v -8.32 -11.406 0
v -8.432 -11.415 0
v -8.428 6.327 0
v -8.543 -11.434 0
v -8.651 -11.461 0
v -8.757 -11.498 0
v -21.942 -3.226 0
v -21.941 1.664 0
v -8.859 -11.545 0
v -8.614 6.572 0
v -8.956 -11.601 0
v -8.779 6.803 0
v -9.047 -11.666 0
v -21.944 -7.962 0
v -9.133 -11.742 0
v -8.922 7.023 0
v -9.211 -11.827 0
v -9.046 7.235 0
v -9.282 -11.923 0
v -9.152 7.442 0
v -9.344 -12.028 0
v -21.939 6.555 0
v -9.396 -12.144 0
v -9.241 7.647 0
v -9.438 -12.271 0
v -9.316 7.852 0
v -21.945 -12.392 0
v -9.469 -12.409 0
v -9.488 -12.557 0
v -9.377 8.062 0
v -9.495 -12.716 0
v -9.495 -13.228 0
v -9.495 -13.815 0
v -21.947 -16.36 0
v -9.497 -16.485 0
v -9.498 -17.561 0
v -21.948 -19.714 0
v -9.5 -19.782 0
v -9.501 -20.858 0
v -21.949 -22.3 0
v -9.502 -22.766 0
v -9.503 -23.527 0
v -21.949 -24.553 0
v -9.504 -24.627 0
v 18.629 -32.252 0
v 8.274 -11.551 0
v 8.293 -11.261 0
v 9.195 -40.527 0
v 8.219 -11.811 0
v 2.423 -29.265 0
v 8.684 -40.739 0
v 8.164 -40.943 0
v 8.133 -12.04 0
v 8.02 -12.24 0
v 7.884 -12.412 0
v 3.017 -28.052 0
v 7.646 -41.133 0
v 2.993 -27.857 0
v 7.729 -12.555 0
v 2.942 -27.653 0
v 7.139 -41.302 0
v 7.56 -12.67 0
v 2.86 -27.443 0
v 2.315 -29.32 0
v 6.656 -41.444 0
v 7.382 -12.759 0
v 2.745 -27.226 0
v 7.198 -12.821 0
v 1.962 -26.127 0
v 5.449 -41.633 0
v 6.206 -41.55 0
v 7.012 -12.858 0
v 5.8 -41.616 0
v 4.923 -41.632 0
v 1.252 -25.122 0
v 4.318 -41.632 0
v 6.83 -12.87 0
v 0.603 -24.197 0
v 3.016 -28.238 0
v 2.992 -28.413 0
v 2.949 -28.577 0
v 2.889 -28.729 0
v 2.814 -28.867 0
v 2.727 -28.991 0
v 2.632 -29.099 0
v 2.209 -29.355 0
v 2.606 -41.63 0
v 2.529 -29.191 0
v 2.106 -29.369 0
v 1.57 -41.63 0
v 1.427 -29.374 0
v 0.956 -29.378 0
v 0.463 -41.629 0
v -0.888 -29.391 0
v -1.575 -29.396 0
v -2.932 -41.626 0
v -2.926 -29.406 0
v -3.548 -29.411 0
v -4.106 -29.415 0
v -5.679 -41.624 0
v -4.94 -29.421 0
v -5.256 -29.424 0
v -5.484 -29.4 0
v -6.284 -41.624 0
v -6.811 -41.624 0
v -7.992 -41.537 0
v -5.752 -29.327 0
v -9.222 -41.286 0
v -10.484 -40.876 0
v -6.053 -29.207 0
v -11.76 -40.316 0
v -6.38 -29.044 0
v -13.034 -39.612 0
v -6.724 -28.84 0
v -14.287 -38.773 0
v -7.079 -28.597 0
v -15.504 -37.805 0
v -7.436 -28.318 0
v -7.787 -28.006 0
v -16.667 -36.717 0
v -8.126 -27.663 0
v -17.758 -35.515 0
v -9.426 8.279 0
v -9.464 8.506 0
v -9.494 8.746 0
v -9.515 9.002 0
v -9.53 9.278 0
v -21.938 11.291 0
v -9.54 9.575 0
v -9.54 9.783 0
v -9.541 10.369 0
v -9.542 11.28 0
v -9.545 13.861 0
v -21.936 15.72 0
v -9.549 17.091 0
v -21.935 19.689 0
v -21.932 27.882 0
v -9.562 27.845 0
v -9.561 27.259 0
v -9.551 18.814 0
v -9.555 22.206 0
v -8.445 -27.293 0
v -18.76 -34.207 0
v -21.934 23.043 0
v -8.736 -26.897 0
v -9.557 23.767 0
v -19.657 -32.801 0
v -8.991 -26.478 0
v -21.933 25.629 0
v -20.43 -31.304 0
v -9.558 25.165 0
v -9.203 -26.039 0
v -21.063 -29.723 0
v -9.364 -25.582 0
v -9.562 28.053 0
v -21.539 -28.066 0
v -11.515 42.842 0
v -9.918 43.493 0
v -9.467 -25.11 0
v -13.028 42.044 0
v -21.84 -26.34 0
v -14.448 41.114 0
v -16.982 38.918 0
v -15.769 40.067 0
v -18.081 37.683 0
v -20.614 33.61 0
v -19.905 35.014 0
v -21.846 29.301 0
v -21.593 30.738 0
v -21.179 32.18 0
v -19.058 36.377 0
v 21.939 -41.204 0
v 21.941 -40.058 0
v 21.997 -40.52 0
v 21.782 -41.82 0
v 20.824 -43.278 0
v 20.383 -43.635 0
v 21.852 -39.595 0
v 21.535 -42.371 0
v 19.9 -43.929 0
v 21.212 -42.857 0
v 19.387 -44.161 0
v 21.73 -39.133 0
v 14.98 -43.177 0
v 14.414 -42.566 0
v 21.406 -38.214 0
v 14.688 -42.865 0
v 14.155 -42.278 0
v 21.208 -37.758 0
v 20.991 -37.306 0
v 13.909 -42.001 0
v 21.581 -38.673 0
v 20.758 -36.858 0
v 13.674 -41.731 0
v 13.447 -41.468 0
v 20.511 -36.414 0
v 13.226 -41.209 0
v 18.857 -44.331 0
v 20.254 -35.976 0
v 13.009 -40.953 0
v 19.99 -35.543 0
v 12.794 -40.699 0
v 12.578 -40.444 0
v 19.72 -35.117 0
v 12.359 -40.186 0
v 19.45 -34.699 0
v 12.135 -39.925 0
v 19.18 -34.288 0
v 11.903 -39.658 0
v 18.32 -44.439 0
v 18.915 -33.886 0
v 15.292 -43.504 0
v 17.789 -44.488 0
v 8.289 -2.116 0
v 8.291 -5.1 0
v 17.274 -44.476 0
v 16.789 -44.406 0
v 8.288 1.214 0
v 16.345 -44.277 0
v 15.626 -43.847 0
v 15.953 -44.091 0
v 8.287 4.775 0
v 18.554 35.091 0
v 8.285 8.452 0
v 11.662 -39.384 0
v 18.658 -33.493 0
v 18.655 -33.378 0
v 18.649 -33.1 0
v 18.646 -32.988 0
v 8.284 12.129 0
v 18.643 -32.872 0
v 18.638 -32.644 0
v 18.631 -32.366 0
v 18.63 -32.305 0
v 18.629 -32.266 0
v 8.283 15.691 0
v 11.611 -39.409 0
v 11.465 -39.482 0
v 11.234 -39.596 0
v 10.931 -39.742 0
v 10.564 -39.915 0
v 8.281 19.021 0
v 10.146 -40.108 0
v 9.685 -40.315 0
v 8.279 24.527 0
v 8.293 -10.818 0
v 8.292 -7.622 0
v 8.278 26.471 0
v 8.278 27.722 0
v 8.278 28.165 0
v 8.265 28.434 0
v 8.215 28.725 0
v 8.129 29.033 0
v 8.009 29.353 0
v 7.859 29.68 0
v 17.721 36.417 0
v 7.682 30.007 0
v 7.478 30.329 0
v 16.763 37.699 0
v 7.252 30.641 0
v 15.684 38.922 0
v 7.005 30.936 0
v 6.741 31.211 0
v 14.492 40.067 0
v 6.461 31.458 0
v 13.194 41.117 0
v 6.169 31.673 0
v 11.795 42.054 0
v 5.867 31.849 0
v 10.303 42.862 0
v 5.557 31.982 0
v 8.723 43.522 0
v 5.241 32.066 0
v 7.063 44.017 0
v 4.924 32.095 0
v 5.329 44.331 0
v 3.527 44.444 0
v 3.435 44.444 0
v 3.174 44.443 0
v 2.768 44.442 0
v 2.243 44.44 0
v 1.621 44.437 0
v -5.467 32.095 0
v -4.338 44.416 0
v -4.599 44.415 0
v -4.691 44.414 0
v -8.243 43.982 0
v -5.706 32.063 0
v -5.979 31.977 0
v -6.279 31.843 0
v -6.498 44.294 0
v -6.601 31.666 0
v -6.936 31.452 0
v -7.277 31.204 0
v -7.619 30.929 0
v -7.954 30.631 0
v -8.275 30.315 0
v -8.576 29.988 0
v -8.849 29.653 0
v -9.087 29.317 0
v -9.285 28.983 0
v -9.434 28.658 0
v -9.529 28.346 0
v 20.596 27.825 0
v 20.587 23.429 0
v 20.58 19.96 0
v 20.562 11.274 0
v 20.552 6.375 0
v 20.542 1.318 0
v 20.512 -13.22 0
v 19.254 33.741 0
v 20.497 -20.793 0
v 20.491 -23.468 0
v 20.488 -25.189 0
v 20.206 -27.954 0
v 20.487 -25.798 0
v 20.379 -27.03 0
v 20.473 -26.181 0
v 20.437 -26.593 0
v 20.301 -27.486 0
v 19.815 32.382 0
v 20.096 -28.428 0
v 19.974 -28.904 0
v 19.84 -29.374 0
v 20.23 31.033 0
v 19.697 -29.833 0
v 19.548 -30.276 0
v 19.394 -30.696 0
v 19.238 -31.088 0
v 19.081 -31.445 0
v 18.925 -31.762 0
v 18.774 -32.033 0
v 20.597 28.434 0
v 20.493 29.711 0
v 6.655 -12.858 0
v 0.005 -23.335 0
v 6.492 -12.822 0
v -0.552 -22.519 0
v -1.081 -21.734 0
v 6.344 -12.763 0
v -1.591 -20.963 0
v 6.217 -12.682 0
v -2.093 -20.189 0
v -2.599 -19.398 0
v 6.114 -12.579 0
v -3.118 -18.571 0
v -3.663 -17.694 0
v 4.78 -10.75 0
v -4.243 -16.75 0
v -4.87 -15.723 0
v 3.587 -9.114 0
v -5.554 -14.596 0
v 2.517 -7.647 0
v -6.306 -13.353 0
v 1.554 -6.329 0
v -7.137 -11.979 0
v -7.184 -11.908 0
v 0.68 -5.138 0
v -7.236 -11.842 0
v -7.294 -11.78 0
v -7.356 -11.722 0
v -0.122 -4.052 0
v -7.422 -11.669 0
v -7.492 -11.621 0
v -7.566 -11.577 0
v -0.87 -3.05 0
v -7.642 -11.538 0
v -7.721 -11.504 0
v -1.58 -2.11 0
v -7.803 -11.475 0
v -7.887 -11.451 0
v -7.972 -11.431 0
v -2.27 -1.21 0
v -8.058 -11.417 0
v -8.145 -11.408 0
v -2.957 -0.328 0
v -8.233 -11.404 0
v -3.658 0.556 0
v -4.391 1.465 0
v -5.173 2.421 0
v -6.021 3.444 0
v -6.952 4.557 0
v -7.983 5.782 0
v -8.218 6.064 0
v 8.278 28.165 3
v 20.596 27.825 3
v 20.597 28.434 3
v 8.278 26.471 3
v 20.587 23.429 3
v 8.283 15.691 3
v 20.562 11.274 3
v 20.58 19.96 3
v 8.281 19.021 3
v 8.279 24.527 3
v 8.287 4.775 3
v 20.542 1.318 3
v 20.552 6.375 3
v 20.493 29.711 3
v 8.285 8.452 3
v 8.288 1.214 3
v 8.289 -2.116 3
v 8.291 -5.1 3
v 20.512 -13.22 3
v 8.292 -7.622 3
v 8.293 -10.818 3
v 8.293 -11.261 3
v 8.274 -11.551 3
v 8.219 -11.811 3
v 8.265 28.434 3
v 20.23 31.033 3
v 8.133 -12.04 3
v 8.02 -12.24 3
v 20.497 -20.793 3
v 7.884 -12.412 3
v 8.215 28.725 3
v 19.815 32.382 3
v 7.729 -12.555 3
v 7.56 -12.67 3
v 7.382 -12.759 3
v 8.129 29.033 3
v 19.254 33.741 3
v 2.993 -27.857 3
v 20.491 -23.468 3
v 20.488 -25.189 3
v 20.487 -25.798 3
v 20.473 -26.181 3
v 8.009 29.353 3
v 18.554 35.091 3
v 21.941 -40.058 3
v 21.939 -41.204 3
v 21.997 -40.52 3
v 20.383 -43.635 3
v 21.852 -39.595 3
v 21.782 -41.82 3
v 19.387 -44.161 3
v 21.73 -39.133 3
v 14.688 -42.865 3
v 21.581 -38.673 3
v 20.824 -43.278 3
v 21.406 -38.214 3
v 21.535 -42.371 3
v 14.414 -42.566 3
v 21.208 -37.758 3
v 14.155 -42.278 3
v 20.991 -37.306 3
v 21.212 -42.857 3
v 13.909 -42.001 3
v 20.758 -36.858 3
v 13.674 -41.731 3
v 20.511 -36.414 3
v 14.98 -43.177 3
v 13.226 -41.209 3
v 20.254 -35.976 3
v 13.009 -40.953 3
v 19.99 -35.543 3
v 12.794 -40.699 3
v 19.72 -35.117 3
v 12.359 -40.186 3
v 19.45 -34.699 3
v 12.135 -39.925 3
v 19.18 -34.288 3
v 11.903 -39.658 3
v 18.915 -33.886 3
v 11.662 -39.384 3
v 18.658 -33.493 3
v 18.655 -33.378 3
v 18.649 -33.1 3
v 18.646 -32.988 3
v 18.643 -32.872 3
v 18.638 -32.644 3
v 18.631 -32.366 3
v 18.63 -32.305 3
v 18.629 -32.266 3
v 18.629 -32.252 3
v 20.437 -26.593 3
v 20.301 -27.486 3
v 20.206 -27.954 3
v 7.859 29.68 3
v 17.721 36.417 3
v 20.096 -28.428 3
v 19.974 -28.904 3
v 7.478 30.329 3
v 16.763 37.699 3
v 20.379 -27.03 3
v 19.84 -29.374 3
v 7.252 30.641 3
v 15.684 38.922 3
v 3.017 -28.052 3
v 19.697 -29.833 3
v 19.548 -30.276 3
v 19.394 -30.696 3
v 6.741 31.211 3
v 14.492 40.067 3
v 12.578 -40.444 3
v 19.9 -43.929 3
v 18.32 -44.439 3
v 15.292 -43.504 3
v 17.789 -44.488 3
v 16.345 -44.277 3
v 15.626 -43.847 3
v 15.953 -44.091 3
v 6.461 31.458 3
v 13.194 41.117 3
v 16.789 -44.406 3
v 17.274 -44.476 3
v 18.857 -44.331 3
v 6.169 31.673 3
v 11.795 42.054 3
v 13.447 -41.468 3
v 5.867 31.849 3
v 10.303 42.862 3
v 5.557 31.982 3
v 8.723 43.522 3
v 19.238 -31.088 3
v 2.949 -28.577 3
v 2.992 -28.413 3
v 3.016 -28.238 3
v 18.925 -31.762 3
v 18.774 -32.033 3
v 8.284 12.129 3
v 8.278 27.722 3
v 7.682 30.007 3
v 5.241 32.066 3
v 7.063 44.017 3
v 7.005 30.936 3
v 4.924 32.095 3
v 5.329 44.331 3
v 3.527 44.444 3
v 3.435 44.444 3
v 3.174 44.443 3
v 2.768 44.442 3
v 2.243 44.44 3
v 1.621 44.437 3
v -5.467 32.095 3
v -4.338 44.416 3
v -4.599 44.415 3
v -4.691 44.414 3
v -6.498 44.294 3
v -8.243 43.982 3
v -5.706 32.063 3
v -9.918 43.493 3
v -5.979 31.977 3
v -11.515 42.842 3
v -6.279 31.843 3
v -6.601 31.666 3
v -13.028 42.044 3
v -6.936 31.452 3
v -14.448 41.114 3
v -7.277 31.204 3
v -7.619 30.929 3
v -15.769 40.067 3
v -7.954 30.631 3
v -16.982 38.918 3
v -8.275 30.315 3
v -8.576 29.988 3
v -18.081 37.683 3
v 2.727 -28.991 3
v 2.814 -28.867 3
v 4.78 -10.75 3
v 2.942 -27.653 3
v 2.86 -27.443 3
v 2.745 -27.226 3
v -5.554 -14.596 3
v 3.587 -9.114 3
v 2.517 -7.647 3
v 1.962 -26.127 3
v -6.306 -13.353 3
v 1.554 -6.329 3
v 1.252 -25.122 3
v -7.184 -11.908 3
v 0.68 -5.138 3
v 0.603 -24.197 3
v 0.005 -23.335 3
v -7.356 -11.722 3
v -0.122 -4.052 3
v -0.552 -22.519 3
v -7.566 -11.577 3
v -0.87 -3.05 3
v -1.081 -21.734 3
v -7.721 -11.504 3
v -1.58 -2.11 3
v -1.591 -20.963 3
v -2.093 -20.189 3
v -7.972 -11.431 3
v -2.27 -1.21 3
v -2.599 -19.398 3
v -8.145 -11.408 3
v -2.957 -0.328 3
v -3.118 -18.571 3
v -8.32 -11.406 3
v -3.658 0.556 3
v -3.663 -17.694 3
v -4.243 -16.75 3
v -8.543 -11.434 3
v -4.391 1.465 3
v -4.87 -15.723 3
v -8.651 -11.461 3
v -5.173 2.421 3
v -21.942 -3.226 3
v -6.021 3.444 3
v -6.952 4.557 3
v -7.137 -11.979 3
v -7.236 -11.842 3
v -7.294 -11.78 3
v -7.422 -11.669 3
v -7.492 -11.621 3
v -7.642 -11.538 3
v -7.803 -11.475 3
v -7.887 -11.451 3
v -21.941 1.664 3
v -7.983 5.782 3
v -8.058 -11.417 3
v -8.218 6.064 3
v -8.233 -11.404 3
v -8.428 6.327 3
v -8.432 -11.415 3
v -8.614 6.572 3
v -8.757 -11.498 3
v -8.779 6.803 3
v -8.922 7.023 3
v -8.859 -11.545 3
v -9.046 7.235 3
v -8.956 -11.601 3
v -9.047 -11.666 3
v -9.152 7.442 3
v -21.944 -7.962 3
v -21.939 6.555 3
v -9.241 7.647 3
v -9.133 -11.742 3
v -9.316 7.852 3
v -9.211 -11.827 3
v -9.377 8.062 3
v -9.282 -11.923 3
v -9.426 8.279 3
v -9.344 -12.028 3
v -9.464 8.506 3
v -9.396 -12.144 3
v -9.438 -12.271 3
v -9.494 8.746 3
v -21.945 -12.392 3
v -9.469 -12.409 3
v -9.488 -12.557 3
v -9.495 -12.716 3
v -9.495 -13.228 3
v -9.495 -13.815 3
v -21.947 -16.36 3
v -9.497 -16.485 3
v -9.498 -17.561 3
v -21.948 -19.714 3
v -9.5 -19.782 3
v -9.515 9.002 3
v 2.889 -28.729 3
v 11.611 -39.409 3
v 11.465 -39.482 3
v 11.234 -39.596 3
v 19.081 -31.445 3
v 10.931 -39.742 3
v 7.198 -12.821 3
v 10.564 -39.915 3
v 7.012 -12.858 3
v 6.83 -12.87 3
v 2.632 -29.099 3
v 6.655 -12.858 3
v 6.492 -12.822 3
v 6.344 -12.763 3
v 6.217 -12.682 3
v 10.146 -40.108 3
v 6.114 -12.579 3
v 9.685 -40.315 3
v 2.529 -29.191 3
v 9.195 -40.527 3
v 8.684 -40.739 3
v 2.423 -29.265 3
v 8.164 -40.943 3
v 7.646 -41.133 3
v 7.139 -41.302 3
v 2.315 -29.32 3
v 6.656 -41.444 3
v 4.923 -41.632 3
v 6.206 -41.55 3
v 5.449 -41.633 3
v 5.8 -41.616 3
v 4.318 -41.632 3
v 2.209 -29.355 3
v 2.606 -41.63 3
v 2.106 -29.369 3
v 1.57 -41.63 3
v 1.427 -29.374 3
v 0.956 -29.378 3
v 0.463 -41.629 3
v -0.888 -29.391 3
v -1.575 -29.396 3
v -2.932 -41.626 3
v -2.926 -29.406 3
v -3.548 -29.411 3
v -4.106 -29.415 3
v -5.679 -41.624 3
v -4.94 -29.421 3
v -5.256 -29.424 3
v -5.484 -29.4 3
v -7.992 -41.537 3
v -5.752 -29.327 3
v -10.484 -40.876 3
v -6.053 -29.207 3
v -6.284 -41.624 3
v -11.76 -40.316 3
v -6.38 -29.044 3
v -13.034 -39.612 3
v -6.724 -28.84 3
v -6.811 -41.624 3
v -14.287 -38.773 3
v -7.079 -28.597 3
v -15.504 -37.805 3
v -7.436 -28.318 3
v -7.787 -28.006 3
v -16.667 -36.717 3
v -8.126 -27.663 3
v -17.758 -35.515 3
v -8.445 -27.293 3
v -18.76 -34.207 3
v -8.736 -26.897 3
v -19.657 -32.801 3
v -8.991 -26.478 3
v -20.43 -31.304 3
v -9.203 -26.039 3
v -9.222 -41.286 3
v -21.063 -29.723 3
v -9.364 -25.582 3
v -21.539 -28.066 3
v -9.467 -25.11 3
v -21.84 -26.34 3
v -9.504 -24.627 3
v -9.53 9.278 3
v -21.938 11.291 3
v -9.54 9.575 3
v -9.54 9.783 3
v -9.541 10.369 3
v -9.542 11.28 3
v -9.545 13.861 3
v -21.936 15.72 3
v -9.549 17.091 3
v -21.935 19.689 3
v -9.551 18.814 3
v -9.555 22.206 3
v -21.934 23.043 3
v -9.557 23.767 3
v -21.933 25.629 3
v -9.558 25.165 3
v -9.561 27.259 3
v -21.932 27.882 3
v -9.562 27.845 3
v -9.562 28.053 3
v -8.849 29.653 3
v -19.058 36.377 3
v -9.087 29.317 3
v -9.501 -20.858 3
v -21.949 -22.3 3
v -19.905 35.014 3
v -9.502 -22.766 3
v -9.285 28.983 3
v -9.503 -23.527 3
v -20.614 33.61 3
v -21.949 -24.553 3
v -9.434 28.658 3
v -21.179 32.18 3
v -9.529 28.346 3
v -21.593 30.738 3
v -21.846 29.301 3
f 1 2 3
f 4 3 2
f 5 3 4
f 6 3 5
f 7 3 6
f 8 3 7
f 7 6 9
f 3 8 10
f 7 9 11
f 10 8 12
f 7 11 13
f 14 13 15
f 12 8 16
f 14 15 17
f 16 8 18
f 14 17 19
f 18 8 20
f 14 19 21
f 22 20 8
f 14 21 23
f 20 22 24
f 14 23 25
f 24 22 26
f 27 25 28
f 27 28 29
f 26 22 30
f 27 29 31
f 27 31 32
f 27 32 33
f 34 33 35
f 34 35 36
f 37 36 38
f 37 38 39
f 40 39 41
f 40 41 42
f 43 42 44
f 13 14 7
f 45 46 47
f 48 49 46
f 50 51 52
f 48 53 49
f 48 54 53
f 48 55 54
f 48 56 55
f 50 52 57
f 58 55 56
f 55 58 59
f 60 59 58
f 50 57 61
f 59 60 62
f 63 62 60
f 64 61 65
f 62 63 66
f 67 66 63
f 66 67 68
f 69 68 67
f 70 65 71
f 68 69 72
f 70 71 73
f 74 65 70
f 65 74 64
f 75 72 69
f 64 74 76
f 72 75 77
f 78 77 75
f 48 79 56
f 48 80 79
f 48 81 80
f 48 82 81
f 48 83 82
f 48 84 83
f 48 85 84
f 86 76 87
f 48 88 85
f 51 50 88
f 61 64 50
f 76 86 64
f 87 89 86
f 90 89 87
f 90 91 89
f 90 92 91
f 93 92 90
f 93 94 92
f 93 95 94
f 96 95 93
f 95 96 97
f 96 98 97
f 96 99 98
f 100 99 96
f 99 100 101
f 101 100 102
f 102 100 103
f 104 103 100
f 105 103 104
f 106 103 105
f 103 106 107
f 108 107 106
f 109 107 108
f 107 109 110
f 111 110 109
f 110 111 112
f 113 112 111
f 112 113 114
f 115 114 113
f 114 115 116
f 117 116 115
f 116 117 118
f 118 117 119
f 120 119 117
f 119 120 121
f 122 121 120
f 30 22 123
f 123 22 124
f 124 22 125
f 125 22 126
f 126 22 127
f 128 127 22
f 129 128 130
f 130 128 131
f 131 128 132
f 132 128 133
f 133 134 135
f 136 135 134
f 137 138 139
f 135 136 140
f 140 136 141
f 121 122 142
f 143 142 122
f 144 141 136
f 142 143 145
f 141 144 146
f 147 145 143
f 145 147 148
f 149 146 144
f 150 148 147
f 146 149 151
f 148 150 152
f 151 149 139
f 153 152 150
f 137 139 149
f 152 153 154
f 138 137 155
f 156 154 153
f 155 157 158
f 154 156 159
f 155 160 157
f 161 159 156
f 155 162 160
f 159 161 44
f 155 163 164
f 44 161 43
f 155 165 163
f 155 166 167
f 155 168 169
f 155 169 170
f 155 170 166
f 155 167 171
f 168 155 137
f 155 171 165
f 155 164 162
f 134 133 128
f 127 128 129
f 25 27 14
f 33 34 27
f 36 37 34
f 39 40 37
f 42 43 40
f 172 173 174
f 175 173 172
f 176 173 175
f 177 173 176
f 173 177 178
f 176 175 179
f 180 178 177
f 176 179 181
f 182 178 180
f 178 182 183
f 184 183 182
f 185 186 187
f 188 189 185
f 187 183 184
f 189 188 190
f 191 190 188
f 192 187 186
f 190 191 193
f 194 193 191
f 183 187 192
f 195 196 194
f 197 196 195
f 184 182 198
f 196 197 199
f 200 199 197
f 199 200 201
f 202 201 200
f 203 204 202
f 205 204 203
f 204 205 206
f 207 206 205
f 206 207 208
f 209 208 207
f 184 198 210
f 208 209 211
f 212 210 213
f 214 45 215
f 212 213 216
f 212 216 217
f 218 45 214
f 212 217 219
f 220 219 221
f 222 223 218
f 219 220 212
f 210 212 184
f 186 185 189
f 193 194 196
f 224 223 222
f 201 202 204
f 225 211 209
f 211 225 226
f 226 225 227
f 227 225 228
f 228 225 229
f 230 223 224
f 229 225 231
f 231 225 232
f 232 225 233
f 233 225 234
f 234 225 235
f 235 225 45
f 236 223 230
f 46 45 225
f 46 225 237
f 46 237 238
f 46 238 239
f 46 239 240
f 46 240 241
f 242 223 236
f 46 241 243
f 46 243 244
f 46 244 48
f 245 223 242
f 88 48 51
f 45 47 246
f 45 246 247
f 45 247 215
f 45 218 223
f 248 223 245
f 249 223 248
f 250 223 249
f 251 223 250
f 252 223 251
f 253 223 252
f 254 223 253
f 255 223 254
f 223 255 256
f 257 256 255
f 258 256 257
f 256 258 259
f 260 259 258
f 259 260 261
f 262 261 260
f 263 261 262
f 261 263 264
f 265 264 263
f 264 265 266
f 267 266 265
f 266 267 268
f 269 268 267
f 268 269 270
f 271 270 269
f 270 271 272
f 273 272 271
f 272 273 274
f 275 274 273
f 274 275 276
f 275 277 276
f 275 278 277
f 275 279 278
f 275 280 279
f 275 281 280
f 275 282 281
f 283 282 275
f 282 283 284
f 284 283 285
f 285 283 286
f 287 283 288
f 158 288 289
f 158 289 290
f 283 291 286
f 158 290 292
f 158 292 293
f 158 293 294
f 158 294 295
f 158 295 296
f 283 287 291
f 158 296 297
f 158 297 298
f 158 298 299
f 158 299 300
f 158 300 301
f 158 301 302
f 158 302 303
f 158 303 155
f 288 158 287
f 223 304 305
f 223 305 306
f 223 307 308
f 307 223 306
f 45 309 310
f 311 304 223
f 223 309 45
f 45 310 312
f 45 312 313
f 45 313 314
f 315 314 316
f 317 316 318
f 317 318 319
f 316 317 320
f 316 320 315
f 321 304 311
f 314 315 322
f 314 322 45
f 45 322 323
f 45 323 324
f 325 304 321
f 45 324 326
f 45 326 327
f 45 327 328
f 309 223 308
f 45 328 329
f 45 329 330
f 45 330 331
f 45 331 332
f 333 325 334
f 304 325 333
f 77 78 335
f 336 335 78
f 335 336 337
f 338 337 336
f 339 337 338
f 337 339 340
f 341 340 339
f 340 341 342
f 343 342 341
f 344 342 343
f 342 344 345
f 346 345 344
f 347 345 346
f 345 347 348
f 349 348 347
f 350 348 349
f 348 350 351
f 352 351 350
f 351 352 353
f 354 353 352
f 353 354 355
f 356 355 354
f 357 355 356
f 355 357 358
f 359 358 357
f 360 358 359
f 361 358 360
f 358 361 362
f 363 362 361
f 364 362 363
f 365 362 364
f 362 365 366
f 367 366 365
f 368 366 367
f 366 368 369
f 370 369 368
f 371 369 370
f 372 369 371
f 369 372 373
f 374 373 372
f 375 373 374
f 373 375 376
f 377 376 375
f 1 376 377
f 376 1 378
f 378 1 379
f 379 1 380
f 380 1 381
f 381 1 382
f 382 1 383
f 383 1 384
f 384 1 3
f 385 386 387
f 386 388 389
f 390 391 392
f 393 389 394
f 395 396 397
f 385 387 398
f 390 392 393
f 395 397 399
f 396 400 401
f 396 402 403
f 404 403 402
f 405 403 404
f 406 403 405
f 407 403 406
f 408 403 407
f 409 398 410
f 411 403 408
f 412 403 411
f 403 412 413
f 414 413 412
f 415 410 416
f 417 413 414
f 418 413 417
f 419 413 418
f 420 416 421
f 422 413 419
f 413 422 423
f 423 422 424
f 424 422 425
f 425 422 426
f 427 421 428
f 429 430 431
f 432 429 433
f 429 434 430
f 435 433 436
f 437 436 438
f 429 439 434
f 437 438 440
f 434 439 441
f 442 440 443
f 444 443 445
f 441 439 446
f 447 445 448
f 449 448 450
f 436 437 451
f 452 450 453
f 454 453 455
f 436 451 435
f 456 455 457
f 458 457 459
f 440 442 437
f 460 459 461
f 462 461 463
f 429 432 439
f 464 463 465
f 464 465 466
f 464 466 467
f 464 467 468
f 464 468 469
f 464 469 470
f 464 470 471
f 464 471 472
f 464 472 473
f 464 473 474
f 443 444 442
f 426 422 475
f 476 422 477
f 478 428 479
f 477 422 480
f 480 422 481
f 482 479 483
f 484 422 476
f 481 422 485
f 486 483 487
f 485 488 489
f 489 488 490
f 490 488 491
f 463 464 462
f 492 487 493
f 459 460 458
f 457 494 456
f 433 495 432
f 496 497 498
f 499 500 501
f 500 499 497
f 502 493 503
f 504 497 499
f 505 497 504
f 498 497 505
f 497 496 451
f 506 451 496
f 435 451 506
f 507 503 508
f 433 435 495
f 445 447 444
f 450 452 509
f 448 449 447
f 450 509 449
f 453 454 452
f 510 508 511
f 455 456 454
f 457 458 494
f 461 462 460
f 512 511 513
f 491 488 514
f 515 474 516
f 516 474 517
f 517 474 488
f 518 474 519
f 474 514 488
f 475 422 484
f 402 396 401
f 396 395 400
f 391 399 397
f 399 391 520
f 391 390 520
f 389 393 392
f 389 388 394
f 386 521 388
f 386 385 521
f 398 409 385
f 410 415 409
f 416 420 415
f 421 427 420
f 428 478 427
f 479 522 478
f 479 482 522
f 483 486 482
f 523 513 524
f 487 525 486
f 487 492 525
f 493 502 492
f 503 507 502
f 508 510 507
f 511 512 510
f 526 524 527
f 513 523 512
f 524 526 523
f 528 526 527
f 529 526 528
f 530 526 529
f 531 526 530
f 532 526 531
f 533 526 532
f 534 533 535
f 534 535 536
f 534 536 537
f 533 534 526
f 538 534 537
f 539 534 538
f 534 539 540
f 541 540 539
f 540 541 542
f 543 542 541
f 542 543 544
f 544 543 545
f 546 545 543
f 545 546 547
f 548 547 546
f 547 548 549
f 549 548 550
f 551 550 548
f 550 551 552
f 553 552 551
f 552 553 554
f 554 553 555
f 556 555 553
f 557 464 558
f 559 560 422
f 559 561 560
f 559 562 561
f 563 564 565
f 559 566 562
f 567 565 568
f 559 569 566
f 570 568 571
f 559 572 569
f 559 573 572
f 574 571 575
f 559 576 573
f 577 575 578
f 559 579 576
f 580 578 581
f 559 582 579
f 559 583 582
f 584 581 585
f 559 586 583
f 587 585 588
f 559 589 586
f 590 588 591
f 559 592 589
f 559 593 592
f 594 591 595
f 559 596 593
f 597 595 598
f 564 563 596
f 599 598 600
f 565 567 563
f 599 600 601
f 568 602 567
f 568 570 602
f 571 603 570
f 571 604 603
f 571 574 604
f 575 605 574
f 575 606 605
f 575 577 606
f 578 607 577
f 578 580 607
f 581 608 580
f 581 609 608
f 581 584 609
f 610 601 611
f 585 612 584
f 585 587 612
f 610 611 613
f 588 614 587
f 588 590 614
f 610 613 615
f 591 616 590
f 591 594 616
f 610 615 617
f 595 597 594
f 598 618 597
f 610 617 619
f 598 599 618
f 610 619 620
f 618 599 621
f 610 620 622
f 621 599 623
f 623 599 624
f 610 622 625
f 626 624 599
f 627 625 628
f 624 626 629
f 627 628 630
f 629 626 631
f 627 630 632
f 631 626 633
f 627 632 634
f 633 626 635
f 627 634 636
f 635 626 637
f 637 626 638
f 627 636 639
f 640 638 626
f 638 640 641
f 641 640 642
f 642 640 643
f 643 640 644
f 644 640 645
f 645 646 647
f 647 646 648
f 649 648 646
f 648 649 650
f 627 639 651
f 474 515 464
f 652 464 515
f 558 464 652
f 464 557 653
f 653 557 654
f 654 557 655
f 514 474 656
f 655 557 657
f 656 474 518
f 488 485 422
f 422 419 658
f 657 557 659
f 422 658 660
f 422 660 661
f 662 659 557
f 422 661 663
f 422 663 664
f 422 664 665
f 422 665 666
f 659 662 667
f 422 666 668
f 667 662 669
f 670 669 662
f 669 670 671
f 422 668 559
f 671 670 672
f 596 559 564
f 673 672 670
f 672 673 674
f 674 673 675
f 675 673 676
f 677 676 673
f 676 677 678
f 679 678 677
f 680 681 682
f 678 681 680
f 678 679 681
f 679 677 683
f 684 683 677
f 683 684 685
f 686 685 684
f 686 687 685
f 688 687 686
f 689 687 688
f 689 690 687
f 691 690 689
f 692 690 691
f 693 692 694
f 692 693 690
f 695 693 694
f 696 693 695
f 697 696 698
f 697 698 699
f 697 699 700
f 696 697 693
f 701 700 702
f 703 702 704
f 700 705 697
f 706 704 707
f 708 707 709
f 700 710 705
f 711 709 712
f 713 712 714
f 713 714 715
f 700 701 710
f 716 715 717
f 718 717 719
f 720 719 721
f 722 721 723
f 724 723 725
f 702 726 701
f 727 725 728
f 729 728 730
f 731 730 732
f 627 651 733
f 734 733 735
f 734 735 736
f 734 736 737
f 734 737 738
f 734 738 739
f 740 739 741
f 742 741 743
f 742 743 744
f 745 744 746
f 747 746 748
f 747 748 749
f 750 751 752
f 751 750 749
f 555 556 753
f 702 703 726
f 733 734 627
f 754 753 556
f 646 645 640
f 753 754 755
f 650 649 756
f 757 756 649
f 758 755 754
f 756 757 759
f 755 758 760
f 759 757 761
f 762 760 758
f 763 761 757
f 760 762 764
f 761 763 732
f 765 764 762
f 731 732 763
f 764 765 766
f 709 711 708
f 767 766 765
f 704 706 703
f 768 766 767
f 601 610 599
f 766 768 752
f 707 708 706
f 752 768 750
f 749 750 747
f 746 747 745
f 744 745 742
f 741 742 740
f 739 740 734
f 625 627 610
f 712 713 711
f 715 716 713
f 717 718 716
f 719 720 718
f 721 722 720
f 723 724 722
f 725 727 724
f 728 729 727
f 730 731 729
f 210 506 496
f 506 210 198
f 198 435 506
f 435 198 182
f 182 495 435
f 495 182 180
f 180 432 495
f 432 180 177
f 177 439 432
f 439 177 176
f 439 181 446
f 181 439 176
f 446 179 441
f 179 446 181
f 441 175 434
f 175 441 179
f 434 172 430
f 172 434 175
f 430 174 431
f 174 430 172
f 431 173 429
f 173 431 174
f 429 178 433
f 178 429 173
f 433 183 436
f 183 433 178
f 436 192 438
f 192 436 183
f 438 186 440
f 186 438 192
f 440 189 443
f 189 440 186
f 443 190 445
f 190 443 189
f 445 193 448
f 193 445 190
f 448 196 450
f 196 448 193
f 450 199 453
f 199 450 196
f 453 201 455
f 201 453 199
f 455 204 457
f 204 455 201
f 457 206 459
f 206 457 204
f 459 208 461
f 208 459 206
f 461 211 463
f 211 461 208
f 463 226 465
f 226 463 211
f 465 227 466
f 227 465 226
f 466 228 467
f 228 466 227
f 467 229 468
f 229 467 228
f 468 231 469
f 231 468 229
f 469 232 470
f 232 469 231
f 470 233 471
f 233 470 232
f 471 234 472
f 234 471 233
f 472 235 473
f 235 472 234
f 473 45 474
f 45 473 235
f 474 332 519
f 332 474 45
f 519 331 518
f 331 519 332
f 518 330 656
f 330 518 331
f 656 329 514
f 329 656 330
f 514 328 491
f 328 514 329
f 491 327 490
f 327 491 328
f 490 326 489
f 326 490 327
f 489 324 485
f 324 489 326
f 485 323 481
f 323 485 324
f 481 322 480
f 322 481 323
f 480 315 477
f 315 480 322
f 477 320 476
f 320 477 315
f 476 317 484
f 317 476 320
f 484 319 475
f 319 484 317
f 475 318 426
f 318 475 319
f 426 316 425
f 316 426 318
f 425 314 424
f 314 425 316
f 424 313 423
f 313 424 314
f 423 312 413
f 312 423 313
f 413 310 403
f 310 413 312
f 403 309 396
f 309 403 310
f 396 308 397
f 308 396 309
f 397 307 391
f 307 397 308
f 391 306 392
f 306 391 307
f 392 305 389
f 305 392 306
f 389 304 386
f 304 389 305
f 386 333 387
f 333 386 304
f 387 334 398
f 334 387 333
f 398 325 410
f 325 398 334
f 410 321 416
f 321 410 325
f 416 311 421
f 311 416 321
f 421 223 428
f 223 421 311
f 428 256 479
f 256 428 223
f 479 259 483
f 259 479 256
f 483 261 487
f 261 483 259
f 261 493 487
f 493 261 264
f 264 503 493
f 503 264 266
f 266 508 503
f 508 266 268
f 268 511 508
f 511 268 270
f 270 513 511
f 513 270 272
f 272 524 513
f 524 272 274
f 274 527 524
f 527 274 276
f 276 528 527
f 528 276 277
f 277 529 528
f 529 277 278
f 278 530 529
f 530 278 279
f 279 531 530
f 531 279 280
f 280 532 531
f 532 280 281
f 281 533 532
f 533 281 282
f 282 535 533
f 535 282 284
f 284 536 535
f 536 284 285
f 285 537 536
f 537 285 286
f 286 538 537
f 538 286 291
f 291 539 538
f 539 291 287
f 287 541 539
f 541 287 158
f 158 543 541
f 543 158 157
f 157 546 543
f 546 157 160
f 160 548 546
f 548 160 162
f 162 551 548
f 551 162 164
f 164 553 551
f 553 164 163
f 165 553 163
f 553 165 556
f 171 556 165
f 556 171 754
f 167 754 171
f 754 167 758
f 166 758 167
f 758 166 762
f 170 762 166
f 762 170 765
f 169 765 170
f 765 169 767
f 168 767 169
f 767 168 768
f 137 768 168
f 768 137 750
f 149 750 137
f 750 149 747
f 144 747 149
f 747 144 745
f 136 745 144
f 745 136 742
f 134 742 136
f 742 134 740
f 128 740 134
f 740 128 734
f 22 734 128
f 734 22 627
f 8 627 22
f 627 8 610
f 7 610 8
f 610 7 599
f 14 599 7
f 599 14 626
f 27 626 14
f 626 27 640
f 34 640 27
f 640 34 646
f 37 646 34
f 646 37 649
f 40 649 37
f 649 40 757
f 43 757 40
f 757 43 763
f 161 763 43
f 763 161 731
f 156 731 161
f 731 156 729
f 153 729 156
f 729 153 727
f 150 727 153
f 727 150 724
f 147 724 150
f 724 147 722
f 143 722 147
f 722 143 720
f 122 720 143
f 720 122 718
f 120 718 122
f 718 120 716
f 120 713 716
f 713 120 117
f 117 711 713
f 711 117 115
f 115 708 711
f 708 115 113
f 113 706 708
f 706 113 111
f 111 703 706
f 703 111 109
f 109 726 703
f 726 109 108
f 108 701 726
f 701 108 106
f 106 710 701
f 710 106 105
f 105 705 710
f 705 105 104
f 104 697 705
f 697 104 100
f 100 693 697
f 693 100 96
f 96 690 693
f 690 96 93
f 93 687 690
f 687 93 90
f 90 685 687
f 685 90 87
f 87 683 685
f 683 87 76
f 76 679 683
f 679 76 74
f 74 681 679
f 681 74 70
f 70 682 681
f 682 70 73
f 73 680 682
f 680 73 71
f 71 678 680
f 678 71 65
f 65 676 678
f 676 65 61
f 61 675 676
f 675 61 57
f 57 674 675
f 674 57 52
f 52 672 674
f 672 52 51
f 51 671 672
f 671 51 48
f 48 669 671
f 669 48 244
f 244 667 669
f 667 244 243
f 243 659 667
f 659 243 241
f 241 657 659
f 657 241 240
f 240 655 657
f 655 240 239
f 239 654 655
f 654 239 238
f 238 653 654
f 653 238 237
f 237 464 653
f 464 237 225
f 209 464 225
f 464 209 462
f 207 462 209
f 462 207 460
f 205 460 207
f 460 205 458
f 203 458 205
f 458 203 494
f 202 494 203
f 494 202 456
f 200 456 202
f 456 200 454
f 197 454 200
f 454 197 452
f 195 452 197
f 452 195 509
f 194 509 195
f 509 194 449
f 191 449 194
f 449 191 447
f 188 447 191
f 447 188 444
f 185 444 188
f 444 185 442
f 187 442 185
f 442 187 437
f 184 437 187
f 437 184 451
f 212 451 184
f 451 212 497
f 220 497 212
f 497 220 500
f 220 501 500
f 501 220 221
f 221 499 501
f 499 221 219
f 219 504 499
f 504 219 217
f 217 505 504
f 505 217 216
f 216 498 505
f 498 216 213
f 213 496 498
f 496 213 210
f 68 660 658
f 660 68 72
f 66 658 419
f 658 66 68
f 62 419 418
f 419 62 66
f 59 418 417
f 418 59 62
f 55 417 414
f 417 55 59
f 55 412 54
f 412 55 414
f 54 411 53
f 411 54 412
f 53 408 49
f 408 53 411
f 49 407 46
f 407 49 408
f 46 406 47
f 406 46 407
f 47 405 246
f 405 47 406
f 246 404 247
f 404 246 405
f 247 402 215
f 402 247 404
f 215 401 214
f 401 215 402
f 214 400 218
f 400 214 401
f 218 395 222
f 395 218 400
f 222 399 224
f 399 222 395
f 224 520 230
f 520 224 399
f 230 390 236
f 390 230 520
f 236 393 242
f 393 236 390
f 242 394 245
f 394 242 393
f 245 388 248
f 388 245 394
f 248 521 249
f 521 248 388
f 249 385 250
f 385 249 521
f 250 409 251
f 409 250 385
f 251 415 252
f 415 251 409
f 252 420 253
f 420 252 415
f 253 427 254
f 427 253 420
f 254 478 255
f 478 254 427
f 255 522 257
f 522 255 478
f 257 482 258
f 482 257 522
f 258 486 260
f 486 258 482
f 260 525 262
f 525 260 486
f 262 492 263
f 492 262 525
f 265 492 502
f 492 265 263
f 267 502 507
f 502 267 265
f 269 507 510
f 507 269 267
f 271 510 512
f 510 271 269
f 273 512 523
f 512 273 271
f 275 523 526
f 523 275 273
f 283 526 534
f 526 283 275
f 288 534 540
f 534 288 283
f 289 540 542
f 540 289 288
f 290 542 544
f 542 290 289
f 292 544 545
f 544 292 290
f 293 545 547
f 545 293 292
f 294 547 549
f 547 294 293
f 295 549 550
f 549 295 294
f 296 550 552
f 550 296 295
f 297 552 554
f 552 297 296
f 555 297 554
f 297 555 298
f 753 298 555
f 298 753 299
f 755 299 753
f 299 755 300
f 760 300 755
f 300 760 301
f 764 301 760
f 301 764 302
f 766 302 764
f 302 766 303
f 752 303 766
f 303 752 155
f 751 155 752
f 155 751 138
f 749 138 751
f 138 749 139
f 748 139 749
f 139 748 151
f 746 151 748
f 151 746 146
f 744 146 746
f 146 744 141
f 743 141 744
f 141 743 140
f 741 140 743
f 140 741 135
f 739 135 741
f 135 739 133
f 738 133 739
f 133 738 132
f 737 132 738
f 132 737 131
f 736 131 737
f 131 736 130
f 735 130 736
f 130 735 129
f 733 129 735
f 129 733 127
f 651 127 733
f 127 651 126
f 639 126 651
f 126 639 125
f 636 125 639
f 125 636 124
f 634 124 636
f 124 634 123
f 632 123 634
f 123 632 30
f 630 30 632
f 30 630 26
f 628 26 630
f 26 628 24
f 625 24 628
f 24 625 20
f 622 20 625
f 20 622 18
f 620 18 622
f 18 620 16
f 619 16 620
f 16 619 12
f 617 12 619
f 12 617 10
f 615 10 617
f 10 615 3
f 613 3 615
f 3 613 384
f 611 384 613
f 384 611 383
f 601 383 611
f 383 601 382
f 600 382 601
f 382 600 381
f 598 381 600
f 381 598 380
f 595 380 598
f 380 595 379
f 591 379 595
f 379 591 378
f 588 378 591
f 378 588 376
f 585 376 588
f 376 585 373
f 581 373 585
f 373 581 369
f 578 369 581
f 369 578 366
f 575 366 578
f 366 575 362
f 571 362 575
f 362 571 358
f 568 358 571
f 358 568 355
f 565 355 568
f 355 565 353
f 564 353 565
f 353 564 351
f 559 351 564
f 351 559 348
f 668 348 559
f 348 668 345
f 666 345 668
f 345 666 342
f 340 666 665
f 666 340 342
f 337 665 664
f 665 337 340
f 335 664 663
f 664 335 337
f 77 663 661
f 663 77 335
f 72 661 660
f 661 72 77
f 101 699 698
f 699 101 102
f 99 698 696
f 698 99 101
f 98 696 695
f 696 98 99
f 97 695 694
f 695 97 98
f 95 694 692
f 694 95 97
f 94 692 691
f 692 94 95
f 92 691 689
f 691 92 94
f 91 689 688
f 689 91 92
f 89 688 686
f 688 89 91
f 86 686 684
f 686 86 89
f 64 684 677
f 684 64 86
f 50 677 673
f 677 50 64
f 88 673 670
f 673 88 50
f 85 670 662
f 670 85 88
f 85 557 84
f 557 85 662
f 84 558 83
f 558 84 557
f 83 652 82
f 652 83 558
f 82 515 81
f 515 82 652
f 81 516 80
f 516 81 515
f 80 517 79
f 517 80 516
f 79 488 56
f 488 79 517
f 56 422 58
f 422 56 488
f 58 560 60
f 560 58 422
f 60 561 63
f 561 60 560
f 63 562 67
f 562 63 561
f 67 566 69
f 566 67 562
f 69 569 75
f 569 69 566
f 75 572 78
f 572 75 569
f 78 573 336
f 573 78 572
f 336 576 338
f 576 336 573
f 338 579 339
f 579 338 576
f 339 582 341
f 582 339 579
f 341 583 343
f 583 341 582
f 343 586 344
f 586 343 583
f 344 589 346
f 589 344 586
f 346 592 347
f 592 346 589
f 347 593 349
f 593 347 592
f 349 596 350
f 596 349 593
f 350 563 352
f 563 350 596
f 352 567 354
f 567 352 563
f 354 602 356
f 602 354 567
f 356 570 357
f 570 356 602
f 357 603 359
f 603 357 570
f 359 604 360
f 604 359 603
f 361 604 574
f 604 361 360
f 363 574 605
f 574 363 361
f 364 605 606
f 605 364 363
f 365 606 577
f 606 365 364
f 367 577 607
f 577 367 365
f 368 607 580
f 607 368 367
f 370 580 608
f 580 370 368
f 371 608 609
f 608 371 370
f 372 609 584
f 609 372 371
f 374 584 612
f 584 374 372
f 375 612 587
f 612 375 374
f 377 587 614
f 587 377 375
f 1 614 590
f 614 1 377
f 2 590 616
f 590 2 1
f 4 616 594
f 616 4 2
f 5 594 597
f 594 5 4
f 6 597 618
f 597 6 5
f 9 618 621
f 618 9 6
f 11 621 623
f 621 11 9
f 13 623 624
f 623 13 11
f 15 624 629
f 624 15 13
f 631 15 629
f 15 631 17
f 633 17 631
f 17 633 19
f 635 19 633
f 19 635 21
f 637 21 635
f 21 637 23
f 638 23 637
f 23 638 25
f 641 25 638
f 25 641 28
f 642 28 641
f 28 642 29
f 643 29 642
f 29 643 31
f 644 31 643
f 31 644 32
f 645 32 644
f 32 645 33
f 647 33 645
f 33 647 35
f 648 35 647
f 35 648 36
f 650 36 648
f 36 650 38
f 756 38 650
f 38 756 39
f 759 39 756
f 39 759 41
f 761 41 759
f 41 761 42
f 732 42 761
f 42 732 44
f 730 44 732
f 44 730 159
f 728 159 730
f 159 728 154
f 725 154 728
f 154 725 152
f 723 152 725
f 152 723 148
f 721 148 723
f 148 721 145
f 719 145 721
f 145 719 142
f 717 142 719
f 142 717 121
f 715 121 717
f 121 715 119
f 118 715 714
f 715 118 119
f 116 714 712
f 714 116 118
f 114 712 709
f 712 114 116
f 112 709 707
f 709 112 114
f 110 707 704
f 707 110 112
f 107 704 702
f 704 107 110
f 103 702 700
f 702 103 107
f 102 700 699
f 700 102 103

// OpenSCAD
// Generated from 交通部公路局（原交通部公路總局）「新式號牌使用之英文字、數字字體」author trace
fudge = 0.1;

module glyph_2012_Q(h = 3) {
  difference() {
    linear_extrude(height = h)
      polygon(points = [[-4.6912, 44.4144], [-6.4983, 44.2944], [-8.243, 43.9823], [-9.9178, 43.493], [-11.5153, 42.8418], [-13.028, 42.0436], [-14.4484, 41.1136], [-15.769, 40.0669], [-16.9825, 38.9185], [-18.0812, 37.6835], [-19.0577, 36.3771], [-19.9046, 35.0142], [-20.6144, 33.6101], [-21.1795, 32.1797], [-21.5926, 30.7381], [-21.8461, 29.3006], [-21.9325, 27.882], [-21.9327, 27.2931], [-21.9333, 25.6289], [-21.9341, 23.043], [-21.9352, 19.689], [-21.9364, 15.7205], [-21.9379, 11.2912], [-21.9394, 6.5546], [-21.941, 1.6644], [-21.9425, -3.2259], [-21.944, -7.9624], [-21.9455, -12.3918], [-21.9467, -16.3603], [-21.9478, -19.7143], [-21.9486, -22.3002], [-21.9492, -23.9644], [-21.9494, -24.5533], [-21.8401, -26.3402], [-21.539, -28.0659], [-21.0632, -29.7229], [-20.43, -31.3038], [-19.6566, -32.801], [-18.7601, -34.2073], [-17.7577, -35.515], [-16.6667, -36.7169], [-15.5042, -37.8053], [-14.2875, -38.7729], [-13.0337, -39.6122], [-11.7601, -40.3158], [-10.4838, -40.8762], [-9.222, -41.2859], [-7.9919, -41.5375], [-6.8107, -41.6236], [-6.673, -41.6237], [-6.2839, -41.624], [-5.6793, -41.6244], [-4.8951, -41.625], [-3.9672, -41.6257], [-2.9316, -41.6265], [-1.8241, -41.6273], [-0.6807, -41.6281], [0.4627, -41.6289], [1.5702, -41.6298], [2.6059, -41.6305], [3.5338, -41.6312], [4.318, -41.6318], [4.9226, -41.6322], [5.3117, -41.6325], [5.4494, -41.6326], [5.8001, -41.6156], [6.2058, -41.5504], [6.6557, -41.4437], [7.1392, -41.3024], [7.6456, -41.1332], [8.1641, -40.9431], [8.6841, -40.7387], [9.1948, -40.527], [9.6855, -40.3146], [10.1456, -40.1085], [10.5642, -39.9154], [10.9308, -39.7422], [11.2345, -39.5956], [11.4647, -39.4824], [11.6107, -39.4095], [11.6618, -39.3837], [11.9034, -39.6581], [12.1351, -39.925], [12.3593, -40.1864], [12.5783, -40.4437], [12.7942, -40.6988], [13.0095, -40.9534], [13.2263, -41.2092], [13.447, -41.4679], [13.6738, -41.7312], [13.9091, -42.0008], [14.1552, -42.2785], [14.4142, -42.5659], [14.6885, -42.8648], [14.9804, -43.1769], [15.2921, -43.5039], [15.6261, -43.8474], [15.9535, -44.0909], [16.3453, -44.2773], [16.7895, -44.4061], [17.2745, -44.4765], [17.7886, -44.4879], [18.3199, -44.4395], [18.8567, -44.3307], [19.3872, -44.1608], [19.8998, -43.9292], [20.3826, -43.6351], [20.824, -43.2778], [21.2121, -42.8567], [21.5352, -42.3711], [21.7816, -41.8203], [21.9394, -41.2036], [21.997, -40.5204], [21.9415, -40.0576], [21.8516, -39.595], [21.7303, -39.1331], [21.5807, -38.6726], [21.4057, -38.2142], [21.2083, -37.7584], [20.9915, -37.3061], [20.7582, -36.8577], [20.5115, -36.414], [20.2543, -35.9756], [19.9896, -35.5432], [19.7204, -35.1173], [19.4496, -34.6988], [19.1803, -34.2881], [18.9154, -33.8859], [18.6579, -33.493], [18.6576, -33.479], [18.6567, -33.4396], [18.6553, -33.3784], [18.6534, -33.299], [18.6512, -33.2051], [18.6487, -33.1002], [18.6461, -32.9881], [18.6433, -32.8724], [18.6406, -32.7566], [18.638, -32.6445], [18.6355, -32.5396], [18.6333, -32.4457], [18.6314, -32.3663], [18.63, -32.3051], [18.629, -32.2657], [18.6287, -32.2518], [18.7742, -32.0327], [18.9255, -31.7618], [19.0807, -31.4448], [19.2376, -31.0876], [19.394, -30.696], [19.5479, -30.276], [19.6973, -29.8333], [19.8399, -29.3739], [19.9736, -28.9036], [20.0965, -28.4282], [20.2064, -27.9536], [20.3011, -27.4858], [20.3786, -27.0304], [20.4367, -26.5935], [20.4735, -26.1808], [20.4867, -25.7983], [20.4879, -25.1892], [20.4914, -23.468], [20.4969, -20.7935], [20.5039, -17.3245], [20.5122, -13.22], [20.5215, -8.6389], [20.5315, -3.74], [20.5418, 1.3177], [20.552, 6.3755], [20.562, 11.2744], [20.5713, 15.8555], [20.5796, 19.96], [20.5867, 23.429], [20.5921, 26.1035], [20.5956, 27.8247], [20.5968, 28.4338], [20.4927, 29.7112], [20.2299, 31.0332], [19.8148, 32.3821], [19.2541, 33.7406], [18.5541, 35.0913], [17.7215, 36.4167], [16.7626, 37.6993], [15.6841, 38.9218], [14.4924, 40.0667], [13.1939, 41.1166], [11.7953, 42.0541], [10.303, 42.8616], [8.7235, 43.5219], [7.0633, 44.0174], [5.3289, 44.3307], [3.5269, 44.4444], [3.4346, 44.444], [3.1737, 44.4431], [2.7685, 44.4416], [2.2428, 44.4397], [1.6208, 44.4374], [0.9266, 44.4349], [0.1843, 44.4322], [-0.5822, 44.4294], [-1.3486, 44.4266], [-2.091, 44.4239], [-2.7852, 44.4214], [-3.4071, 44.4191], [-3.9328, 44.4172], [-4.3381, 44.4157], [-4.5989, 44.4148]]);
    translate([0, 0, -fudge])
      linear_extrude(height = h + 2 * fudge)
        polygon(points = [[-5.4666, 32.0954], [-5.3499, 32.0954], [-5.0201, 32.0954], [-4.5077, 32.0954], [-3.8431, 32.0954], [-3.0567, 32.0954], [-2.179, 32.0954], [-1.2404, 32.0954], [-0.2713, 32.0954], [0.6977, 32.0954], [1.6363, 32.0954], [2.514, 32.0954], [3.3004, 32.0954], [3.965, 32.0954], [4.4775, 32.0954], [4.8072, 32.0954], [4.9239, 32.0954], [5.2415, 32.0662], [5.5566, 31.9823], [5.8666, 31.8493], [6.1691, 31.6727], [6.4614, 31.458], [6.741, 31.2107], [7.0054, 30.9364], [7.252, 30.6406], [7.4782, 30.3289], [7.6816, 30.0068], [7.8595, 29.6797], [8.0094, 29.3534], [8.1287, 29.0332], [8.2149, 28.7248], [8.2655, 28.4336], [8.2778, 28.1652], [8.278, 27.7224], [8.2785, 26.4711], [8.2792, 24.5268], [8.2802, 22.0049], [8.2814, 19.021], [8.2826, 15.6906], [8.284, 12.1292], [8.2854, 8.4523], [8.2869, 4.7754], [8.2882, 1.2139], [8.2895, -2.1165], [8.2907, -5.1003], [8.2916, -7.6222], [8.2924, -9.5666], [8.2929, -10.8179], [8.293, -11.2606], [8.2739, -11.5511], [8.2191, -11.8108], [8.1329, -12.0404], [8.0197, -12.2405], [7.8836, -12.4117], [7.7292, -12.5548], [7.5605, -12.6703], [7.382, -12.759], [7.1979, -12.8215], [7.0125, -12.8583], [6.8301, -12.8703], [6.6551, -12.858], [6.4917, -12.8221], [6.3442, -12.7632], [6.217, -12.682], [6.1143, -12.5791], [4.7802, -10.7505], [3.587, -9.1138], [2.5173, -7.6472], [1.5541, -6.3293], [0.68, -5.1382], [-0.1222, -4.0524], [-0.8698, -3.0502], [-1.5799, -2.1099], [-2.2699, -1.2098], [-2.957, -0.3284], [-3.6584, 0.5561], [-4.3913, 1.4652], [-5.1731, 2.4207], [-6.0208, 3.4443], [-6.9519, 4.5575], [-7.9834, 5.782], [-8.2184, 6.0645], [-8.4283, 6.3269], [-8.6145, 6.572], [-8.7786, 6.8031], [-8.9218, 7.023], [-9.0457, 7.2349], [-9.1518, 7.4418], [-9.2414, 7.6466], [-9.3161, 7.8524], [-9.3772, 8.0622], [-9.4262, 8.2791], [-9.4645, 8.5061], [-9.4936, 8.7462], [-9.515, 9.0024], [-9.5301, 9.2778], [-9.5402, 9.5753], [-9.5405, 9.7828], [-9.5412, 10.3693], [-9.5422, 11.2805], [-9.5436, 12.4624], [-9.5453, 13.8608], [-9.5471, 15.4216], [-9.549, 17.0907], [-9.5511, 18.814], [-9.5531, 20.5372], [-9.555, 22.2063], [-9.5569, 23.7671], [-9.5585, 25.1655], [-9.5599, 26.3474], [-9.561, 27.2587], [-9.5616, 27.8451], [-9.5619, 28.0526], [-9.5291, 28.346], [-9.4345, 28.6578], [-9.285, 28.9831], [-9.0874, 29.3166], [-8.8487, 29.6532], [-8.5756, 29.9879], [-8.2751, 30.3154], [-7.954, 30.6307], [-7.6191, 30.9286], [-7.2774, 31.2039], [-6.9356, 31.4516], [-6.6007, 31.6665], [-6.2794, 31.8434], [-5.9788, 31.9773], [-5.7056, 32.063], [-5.4666, 32.0954], [-5.4666, 32.0954], [-5.4666, 32.0954], [-5.4666, 32.0954], [-5.4666, 32.0954], [-5.4666, 32.0954], [-5.4666, 32.0954], [-5.4666, 32.0954], [-5.4666, 32.0954], [-5.4666, 32.0954], [-5.4666, 32.0954], [-5.4666, 32.0954], [-5.4666, 32.0954], [-5.4666, 32.0954], [-5.4666, 32.0954], [-5.4666, 32.0954]]);
    translate([0, 0, -fudge])
      linear_extrude(height = h + 2 * fudge)
        polygon(points = [[-8.3203, -11.4056], [-8.2327, -11.4043], [-8.1452, -11.4082], [-8.0581, -11.4173], [-7.9718, -11.4315], [-7.8866, -11.4508], [-7.8031, -11.4751], [-7.7214, -11.5044], [-7.6422, -11.5385], [-7.5656, -11.5774], [-7.4921, -11.621], [-7.422, -11.6694], [-7.3558, -11.7223], [-7.2939, -11.7798], [-7.2365, -11.8417], [-7.1842, -11.9081], [-7.1372, -11.9787], [-6.306, -13.3534], [-5.5538, -14.5961], [-4.8698, -15.723], [-4.2431, -16.7504], [-3.6629, -17.6945], [-3.1184, -18.5715], [-2.5987, -19.3977], [-2.0931, -20.1894], [-1.5907, -20.9627], [-1.0807, -21.7339], [-0.5523, -22.5192], [0.0054, -23.3349], [0.6032, -24.1972], [1.2518, -25.1224], [1.9622, -26.1267], [2.7451, -27.2263], [2.8598, -27.4429], [2.9416, -27.6533], [2.9932, -27.8567], [3.0171, -28.0518], [3.016, -28.2376], [2.9925, -28.4132], [2.9493, -28.5774], [2.8889, -28.7291], [2.8141, -28.8674], [2.7275, -28.9912], [2.6317, -29.0993], [2.5292, -29.1909], [2.4228, -29.2647], [2.3151, -29.3198], [2.2087, -29.3551], [2.1063, -29.3695], [2.0236, -29.3701], [1.79, -29.3718], [1.4269, -29.3745], [0.956, -29.3779], [0.3988, -29.382], [-0.2232, -29.3866], [-0.8882, -29.3915], [-1.5748, -29.3965], [-2.2614, -29.4016], [-2.9265, -29.4065], [-3.5484, -29.411], [-4.1056, -29.4151], [-4.5765, -29.4186], [-4.9396, -29.4213], [-5.1733, -29.423], [-5.2559, -29.4236], [-5.4838, -29.3997], [-5.7522, -29.3267], [-6.0535, -29.2074], [-6.3801, -29.0442], [-6.7243, -28.8399], [-7.0787, -28.5971], [-7.4356, -28.3183], [-7.7873, -28.0062], [-8.1263, -27.6635], [-8.4449, -27.2928], [-8.7356, -26.8966], [-8.9908, -26.4777], [-9.2028, -26.0386], [-9.364, -25.582], [-9.4669, -25.1104], [-9.5038, -24.6266], [-9.5037, -24.4929], [-9.5034, -24.1149], [-9.5029, -23.5275], [-9.5024, -22.7656], [-9.5017, -21.8642], [-9.5009, -20.8581], [-9.5001, -19.7822], [-9.4992, -18.6714], [-9.4983, -17.5606], [-9.4975, -16.4847], [-9.4967, -15.4786], [-9.496, -14.5772], [-9.4954, -13.8153], [-9.495, -13.2279], [-9.4947, -12.8499], [-9.4946, -12.7162], [-9.4882, -12.5569], [-9.4691, -12.4087], [-9.4381, -12.2712], [-9.396, -12.1445], [-9.3436, -12.0284], [-9.2817, -11.9226], [-9.2112, -11.8271], [-9.1328, -11.7417], [-9.0474, -11.6663], [-8.9557, -11.6007], [-8.8587, -11.5448], [-8.757, -11.4985], [-8.6515, -11.4615], [-8.543, -11.4339], [-8.4323, -11.4153], [-8.3203, -11.4057], [-8.3203, -11.4057], [-8.3203, -11.4057], [-8.3203, -11.4057], [-8.3203, -11.4057], [-8.3203, -11.4057], [-8.3203, -11.4056], [-8.3203, -11.4056], [-8.3203, -11.4056], [-8.3203, -11.4056], [-8.3203, -11.4056], [-8.3203, -11.4056], [-8.3203, -11.4056], [-8.3203, -11.4056], [-8.3203, -11.4056], [-8.3203, -11.4056]]);
  }
}

glyph_2012_Q();
